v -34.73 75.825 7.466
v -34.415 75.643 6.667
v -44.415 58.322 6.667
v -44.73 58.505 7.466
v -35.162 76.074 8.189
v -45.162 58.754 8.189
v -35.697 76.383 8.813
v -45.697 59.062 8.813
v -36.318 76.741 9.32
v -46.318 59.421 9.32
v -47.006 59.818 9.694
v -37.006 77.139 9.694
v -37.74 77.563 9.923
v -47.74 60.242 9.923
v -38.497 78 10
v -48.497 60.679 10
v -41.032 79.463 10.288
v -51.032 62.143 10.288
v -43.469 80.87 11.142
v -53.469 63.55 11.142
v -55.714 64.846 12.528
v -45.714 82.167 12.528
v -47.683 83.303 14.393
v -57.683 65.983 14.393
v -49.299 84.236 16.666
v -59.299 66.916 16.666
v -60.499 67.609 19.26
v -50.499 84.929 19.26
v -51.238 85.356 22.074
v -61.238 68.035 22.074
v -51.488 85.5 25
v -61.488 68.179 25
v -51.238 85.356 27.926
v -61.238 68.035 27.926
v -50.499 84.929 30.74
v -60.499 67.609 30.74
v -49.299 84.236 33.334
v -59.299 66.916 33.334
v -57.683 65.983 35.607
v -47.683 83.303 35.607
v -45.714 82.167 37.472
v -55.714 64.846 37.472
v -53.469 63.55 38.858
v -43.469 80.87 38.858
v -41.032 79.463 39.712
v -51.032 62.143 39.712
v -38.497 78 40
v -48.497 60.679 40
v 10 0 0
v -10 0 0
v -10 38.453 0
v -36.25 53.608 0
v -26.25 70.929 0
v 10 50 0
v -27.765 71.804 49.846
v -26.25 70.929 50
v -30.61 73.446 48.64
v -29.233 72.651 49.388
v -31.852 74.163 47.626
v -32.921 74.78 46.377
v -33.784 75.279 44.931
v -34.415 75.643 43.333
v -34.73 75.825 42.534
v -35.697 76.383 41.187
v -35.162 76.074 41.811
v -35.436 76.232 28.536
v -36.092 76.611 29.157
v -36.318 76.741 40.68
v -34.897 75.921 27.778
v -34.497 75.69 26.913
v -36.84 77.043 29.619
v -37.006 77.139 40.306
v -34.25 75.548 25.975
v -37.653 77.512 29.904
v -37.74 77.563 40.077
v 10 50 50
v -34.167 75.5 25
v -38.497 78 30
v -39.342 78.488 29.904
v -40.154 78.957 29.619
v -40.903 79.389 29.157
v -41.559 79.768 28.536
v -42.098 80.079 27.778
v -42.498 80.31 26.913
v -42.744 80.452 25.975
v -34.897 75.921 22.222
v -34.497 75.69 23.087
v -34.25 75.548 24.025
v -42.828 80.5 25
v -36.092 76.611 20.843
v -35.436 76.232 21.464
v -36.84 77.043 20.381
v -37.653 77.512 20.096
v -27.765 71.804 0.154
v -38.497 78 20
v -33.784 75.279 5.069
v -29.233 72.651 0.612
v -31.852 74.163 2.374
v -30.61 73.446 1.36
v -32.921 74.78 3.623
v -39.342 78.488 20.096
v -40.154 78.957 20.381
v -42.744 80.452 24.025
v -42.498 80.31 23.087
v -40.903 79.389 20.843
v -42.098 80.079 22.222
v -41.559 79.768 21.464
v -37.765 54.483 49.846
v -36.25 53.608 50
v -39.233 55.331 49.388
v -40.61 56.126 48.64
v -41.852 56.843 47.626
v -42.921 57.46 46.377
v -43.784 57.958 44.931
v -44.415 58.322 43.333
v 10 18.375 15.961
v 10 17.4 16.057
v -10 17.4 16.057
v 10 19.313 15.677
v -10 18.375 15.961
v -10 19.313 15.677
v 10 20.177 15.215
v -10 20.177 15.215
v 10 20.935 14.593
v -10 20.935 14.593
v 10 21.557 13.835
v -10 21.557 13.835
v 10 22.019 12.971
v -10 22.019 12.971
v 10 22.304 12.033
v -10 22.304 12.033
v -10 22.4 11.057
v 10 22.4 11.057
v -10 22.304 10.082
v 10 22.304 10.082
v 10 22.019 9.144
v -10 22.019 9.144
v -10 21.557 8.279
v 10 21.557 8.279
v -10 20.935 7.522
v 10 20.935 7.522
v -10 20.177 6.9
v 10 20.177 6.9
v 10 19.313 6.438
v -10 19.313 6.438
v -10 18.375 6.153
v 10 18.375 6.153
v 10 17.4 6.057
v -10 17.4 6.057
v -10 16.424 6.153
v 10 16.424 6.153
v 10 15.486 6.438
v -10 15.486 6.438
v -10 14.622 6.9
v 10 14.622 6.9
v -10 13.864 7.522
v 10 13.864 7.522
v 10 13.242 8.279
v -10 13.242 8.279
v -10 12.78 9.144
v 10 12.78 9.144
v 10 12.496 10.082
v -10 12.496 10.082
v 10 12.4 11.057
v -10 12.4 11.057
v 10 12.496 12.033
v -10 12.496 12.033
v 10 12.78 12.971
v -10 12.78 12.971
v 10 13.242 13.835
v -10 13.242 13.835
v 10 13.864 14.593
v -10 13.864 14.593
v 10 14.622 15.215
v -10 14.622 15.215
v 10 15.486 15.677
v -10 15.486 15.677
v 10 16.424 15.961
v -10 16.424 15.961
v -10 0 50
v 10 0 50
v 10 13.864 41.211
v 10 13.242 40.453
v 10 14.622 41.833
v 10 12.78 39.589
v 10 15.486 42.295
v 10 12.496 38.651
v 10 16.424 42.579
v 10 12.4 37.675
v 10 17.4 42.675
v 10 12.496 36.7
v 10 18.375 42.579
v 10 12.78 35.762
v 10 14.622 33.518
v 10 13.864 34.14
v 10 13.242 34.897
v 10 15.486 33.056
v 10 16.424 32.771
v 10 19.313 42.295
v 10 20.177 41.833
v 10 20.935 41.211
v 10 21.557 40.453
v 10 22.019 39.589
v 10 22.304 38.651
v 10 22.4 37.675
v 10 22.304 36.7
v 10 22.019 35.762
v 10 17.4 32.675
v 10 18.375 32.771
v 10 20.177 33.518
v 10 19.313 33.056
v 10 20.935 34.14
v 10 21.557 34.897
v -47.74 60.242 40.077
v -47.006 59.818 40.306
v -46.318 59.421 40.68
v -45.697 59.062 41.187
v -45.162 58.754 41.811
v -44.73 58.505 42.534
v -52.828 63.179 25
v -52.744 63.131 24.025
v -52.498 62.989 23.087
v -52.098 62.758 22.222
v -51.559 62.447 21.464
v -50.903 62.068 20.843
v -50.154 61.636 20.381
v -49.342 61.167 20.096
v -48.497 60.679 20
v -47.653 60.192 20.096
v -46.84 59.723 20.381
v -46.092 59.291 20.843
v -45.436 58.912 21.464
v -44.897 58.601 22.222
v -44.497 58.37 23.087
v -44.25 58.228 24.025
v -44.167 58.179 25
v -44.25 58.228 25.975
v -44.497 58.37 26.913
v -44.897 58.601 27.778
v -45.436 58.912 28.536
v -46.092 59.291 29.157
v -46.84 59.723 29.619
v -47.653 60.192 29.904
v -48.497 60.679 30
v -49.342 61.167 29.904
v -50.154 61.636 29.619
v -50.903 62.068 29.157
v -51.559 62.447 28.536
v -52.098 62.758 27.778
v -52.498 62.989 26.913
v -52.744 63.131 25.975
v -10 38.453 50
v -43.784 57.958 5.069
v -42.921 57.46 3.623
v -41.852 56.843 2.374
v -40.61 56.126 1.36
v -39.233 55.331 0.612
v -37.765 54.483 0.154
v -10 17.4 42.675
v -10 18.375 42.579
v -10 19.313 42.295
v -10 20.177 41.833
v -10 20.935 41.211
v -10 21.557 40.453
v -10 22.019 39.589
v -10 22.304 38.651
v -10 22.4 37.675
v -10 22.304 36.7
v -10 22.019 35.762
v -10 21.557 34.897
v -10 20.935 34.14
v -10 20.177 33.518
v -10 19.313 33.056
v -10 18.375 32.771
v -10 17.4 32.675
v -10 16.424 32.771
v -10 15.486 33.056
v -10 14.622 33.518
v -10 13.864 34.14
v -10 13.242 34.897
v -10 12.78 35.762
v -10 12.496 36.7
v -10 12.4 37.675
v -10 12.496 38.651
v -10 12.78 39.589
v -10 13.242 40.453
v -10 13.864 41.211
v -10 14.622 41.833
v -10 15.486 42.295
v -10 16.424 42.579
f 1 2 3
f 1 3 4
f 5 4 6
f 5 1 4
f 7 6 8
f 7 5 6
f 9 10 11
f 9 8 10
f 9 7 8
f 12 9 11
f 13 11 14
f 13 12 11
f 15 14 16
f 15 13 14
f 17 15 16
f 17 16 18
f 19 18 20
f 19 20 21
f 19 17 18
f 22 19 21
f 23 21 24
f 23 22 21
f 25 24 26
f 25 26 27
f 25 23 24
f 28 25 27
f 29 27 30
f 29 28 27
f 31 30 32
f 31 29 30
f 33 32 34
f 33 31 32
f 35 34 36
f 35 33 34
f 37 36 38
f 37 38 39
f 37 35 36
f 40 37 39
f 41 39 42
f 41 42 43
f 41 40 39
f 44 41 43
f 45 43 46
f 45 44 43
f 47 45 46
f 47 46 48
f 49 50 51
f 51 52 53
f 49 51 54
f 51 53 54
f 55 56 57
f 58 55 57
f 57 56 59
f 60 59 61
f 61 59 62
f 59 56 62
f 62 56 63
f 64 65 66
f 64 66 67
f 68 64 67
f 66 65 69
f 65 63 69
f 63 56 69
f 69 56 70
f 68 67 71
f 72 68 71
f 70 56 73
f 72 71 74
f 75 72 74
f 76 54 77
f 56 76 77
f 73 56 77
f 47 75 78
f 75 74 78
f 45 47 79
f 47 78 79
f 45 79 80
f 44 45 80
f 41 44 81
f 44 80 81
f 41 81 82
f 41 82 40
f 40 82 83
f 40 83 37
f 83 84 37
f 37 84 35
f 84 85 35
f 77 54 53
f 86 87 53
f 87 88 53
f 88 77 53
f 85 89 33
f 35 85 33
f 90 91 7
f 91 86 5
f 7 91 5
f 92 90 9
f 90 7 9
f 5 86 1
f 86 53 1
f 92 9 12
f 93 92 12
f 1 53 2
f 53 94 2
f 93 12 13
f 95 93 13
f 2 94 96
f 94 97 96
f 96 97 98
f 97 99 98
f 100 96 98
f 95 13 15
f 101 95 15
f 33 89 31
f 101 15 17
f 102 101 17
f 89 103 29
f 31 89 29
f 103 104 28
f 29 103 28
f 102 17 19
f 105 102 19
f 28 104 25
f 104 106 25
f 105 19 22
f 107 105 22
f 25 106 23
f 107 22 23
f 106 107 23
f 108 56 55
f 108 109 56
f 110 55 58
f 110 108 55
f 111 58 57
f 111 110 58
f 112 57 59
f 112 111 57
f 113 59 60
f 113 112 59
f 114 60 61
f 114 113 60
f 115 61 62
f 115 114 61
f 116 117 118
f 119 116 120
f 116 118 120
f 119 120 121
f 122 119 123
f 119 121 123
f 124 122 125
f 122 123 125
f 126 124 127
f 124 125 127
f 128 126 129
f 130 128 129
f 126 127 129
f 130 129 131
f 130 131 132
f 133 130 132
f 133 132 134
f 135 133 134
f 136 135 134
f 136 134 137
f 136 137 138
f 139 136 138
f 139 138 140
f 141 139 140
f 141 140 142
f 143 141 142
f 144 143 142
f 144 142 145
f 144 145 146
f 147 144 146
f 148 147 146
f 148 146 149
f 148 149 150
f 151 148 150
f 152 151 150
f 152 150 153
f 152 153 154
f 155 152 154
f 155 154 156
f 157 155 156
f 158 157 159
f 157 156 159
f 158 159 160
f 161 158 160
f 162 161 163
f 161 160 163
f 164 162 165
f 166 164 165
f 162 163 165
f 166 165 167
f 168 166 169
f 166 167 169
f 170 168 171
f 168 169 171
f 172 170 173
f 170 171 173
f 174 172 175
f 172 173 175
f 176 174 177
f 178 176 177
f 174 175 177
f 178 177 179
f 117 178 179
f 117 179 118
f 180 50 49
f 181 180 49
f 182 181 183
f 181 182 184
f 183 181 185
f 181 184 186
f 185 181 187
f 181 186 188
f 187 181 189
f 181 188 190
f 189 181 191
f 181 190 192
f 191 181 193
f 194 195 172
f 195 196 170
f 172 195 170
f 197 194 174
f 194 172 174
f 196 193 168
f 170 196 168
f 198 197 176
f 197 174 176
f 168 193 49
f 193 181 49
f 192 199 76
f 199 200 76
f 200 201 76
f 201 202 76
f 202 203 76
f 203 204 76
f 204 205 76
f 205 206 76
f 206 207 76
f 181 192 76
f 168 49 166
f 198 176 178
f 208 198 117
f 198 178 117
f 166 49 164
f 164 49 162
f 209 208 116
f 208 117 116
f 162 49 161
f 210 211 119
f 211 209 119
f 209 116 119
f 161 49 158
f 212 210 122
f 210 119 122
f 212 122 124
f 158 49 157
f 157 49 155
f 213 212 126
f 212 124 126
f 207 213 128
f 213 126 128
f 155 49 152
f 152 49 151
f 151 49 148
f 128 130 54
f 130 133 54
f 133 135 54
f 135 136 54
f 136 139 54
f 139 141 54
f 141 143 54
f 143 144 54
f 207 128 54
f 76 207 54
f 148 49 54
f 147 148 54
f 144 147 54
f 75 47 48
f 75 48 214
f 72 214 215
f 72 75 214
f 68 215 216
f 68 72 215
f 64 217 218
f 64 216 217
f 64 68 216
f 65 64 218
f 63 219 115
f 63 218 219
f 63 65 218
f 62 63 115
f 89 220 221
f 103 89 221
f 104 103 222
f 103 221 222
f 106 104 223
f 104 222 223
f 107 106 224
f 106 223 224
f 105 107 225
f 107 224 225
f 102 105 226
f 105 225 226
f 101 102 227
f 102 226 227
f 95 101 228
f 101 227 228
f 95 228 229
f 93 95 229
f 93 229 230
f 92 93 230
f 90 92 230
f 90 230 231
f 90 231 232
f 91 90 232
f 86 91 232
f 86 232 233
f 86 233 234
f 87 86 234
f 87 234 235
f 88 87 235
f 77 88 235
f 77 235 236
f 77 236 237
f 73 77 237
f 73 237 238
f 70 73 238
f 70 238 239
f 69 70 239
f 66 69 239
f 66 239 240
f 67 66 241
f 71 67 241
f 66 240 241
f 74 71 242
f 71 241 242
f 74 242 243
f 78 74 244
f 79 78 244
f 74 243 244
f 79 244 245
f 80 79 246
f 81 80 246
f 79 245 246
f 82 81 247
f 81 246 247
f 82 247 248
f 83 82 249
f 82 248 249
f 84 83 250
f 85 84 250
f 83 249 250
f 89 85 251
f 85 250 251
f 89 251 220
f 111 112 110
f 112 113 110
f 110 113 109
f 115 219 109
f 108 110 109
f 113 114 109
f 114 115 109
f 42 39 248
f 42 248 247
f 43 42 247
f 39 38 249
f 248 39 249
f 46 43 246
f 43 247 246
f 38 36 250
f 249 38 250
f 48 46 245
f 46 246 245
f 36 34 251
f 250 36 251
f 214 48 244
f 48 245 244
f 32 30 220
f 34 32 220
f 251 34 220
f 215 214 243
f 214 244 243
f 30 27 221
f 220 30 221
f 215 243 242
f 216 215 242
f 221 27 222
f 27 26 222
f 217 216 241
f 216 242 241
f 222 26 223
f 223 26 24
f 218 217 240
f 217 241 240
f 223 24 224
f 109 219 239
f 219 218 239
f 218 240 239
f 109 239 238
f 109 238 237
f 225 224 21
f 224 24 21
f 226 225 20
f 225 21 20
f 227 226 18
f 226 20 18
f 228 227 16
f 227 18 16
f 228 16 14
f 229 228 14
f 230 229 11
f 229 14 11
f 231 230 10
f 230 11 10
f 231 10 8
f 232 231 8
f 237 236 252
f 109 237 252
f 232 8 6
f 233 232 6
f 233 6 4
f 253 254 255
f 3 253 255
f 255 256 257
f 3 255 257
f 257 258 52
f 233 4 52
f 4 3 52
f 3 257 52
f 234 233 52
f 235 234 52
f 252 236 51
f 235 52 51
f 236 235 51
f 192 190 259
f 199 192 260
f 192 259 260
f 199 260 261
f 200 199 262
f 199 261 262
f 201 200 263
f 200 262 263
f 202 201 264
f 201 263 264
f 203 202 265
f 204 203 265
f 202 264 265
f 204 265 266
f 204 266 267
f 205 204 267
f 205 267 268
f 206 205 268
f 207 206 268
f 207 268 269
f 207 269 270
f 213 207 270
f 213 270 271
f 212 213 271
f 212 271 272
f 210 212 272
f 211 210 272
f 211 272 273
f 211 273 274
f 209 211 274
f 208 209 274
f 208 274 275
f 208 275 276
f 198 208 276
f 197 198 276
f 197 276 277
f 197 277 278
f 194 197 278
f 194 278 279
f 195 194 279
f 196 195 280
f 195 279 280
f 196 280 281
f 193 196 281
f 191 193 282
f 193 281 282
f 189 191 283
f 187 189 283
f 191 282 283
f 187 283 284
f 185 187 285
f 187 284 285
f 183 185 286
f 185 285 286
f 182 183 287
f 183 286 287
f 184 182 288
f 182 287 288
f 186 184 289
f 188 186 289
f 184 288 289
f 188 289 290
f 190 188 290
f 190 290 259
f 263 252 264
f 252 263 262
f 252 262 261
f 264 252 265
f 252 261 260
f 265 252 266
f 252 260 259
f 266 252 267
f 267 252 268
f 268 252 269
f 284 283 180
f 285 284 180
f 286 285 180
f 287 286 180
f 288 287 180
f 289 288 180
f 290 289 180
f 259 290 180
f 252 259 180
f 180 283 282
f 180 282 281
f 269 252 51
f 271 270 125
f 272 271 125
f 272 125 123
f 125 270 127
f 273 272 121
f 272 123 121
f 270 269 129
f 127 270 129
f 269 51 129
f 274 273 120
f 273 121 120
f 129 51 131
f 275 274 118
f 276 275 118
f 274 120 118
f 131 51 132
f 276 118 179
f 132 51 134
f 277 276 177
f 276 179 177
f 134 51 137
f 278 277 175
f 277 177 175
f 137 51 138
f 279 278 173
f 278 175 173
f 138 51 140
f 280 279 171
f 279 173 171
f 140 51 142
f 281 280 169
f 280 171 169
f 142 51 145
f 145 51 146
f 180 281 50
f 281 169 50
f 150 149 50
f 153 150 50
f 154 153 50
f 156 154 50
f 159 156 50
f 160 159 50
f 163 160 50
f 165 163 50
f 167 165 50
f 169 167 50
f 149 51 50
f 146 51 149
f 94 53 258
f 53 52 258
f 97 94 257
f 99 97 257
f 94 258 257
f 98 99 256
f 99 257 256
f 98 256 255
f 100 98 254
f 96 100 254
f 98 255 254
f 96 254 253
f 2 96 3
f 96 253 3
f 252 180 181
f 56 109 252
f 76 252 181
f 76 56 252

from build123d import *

# Parameters (mm, degrees)
BOSS_EXTRUDE1_DEPTH = 50
CUT_EXTRUDE1_DEPTH  = 110.24284873619861
FILLET1_R           = 10
HOLE1_D             = 10
HOLE2_D             = 10


with BuildPart() as part:
    # Sketch1 → Boss-Extrude1 (new body)
    with BuildSketch(Plane.XY):
        Polygon((-10, 0), (10, 3.67e-15), (9.999999999999991, 50.00000000000001), (-52.35382907247969, 85.99999999999983), (-62.35382907247966, 68.67949192431102), (-10.000000000000009, 38.45299461620743), align=None)
    extrude(amount=BOSS_EXTRUDE1_DEPTH)

    # Sketch2 → Cut-Extrude1 (cut, through all)
    with BuildSketch(Plane(origin=(24.150635094610877, 41.83012701892233, 0), x_dir=(0.86602540378444, -0.4999999999999976, 0), z_dir=(0.4999999999999976, 0.86602540378444, 0))):
        with BuildLine():
            Line((-72.33974596215559, -50), (-88.33974596215548, -50))
            Line((-88.33974596215548, -50), (-88.33974596215548, 0))
            Line((-88.33974596215548, 0), (-72.33974596215559, -6.94e-15))
            ThreePointArc((-72.33974596215559, -6.94e-15), (-67.33974596215559, -5.000000000000008), (-72.33974596215559, -10.000000000000009))
            ThreePointArc((-72.33974596215559, -10.000000000000009), (-87.33974596215559, -25.000000000000007), (-72.33974596215559, -40.000000000000014))
            ThreePointArc((-72.33974596215559, -40.000000000000014), (-67.33974596215559, -45.000000000000014), (-72.33974596215559, -50))
        make_face()
    extrude(amount=-CUT_EXTRUDE1_DEPTH, mode=Mode.SUBTRACT)

    # Fillet1
    fillet1_edges = [part.edges().sort_by_distance(p)[0] for p in [
        (-43.49742261192873, 69.33974596215553, 7.47e-15),
        (-43.49742261192873, 69.33974596215553, 50),
    ]]
    fillet(fillet1_edges, radius=FILLET1_R - 0.0001)  # a hair under: the kernel refuses the full size

    # Hole1 (through all)
    with Locations(Plane(origin=(24.150635094610877, 41.83012701892233, 0), x_dir=(0.86602540378444, -0.4999999999999976, 0), z_dir=(0.4999999999999976, 0.86602540378444, 0))):
        with Locations((-72.339745962, -25)):
            Hole(HOLE1_D / 2)

    # Hole2 (through all)
    with Locations(Plane(origin=(10, 1.73e-15, 0), x_dir=(0, 0, -1), z_dir=(1, 1.7e-16, 0))):
        with Locations((-37.675212833, 17.399574334), (-11.057265884, 17.399574334)):
            Hole(HOLE2_D / 2)


solid = part.part
